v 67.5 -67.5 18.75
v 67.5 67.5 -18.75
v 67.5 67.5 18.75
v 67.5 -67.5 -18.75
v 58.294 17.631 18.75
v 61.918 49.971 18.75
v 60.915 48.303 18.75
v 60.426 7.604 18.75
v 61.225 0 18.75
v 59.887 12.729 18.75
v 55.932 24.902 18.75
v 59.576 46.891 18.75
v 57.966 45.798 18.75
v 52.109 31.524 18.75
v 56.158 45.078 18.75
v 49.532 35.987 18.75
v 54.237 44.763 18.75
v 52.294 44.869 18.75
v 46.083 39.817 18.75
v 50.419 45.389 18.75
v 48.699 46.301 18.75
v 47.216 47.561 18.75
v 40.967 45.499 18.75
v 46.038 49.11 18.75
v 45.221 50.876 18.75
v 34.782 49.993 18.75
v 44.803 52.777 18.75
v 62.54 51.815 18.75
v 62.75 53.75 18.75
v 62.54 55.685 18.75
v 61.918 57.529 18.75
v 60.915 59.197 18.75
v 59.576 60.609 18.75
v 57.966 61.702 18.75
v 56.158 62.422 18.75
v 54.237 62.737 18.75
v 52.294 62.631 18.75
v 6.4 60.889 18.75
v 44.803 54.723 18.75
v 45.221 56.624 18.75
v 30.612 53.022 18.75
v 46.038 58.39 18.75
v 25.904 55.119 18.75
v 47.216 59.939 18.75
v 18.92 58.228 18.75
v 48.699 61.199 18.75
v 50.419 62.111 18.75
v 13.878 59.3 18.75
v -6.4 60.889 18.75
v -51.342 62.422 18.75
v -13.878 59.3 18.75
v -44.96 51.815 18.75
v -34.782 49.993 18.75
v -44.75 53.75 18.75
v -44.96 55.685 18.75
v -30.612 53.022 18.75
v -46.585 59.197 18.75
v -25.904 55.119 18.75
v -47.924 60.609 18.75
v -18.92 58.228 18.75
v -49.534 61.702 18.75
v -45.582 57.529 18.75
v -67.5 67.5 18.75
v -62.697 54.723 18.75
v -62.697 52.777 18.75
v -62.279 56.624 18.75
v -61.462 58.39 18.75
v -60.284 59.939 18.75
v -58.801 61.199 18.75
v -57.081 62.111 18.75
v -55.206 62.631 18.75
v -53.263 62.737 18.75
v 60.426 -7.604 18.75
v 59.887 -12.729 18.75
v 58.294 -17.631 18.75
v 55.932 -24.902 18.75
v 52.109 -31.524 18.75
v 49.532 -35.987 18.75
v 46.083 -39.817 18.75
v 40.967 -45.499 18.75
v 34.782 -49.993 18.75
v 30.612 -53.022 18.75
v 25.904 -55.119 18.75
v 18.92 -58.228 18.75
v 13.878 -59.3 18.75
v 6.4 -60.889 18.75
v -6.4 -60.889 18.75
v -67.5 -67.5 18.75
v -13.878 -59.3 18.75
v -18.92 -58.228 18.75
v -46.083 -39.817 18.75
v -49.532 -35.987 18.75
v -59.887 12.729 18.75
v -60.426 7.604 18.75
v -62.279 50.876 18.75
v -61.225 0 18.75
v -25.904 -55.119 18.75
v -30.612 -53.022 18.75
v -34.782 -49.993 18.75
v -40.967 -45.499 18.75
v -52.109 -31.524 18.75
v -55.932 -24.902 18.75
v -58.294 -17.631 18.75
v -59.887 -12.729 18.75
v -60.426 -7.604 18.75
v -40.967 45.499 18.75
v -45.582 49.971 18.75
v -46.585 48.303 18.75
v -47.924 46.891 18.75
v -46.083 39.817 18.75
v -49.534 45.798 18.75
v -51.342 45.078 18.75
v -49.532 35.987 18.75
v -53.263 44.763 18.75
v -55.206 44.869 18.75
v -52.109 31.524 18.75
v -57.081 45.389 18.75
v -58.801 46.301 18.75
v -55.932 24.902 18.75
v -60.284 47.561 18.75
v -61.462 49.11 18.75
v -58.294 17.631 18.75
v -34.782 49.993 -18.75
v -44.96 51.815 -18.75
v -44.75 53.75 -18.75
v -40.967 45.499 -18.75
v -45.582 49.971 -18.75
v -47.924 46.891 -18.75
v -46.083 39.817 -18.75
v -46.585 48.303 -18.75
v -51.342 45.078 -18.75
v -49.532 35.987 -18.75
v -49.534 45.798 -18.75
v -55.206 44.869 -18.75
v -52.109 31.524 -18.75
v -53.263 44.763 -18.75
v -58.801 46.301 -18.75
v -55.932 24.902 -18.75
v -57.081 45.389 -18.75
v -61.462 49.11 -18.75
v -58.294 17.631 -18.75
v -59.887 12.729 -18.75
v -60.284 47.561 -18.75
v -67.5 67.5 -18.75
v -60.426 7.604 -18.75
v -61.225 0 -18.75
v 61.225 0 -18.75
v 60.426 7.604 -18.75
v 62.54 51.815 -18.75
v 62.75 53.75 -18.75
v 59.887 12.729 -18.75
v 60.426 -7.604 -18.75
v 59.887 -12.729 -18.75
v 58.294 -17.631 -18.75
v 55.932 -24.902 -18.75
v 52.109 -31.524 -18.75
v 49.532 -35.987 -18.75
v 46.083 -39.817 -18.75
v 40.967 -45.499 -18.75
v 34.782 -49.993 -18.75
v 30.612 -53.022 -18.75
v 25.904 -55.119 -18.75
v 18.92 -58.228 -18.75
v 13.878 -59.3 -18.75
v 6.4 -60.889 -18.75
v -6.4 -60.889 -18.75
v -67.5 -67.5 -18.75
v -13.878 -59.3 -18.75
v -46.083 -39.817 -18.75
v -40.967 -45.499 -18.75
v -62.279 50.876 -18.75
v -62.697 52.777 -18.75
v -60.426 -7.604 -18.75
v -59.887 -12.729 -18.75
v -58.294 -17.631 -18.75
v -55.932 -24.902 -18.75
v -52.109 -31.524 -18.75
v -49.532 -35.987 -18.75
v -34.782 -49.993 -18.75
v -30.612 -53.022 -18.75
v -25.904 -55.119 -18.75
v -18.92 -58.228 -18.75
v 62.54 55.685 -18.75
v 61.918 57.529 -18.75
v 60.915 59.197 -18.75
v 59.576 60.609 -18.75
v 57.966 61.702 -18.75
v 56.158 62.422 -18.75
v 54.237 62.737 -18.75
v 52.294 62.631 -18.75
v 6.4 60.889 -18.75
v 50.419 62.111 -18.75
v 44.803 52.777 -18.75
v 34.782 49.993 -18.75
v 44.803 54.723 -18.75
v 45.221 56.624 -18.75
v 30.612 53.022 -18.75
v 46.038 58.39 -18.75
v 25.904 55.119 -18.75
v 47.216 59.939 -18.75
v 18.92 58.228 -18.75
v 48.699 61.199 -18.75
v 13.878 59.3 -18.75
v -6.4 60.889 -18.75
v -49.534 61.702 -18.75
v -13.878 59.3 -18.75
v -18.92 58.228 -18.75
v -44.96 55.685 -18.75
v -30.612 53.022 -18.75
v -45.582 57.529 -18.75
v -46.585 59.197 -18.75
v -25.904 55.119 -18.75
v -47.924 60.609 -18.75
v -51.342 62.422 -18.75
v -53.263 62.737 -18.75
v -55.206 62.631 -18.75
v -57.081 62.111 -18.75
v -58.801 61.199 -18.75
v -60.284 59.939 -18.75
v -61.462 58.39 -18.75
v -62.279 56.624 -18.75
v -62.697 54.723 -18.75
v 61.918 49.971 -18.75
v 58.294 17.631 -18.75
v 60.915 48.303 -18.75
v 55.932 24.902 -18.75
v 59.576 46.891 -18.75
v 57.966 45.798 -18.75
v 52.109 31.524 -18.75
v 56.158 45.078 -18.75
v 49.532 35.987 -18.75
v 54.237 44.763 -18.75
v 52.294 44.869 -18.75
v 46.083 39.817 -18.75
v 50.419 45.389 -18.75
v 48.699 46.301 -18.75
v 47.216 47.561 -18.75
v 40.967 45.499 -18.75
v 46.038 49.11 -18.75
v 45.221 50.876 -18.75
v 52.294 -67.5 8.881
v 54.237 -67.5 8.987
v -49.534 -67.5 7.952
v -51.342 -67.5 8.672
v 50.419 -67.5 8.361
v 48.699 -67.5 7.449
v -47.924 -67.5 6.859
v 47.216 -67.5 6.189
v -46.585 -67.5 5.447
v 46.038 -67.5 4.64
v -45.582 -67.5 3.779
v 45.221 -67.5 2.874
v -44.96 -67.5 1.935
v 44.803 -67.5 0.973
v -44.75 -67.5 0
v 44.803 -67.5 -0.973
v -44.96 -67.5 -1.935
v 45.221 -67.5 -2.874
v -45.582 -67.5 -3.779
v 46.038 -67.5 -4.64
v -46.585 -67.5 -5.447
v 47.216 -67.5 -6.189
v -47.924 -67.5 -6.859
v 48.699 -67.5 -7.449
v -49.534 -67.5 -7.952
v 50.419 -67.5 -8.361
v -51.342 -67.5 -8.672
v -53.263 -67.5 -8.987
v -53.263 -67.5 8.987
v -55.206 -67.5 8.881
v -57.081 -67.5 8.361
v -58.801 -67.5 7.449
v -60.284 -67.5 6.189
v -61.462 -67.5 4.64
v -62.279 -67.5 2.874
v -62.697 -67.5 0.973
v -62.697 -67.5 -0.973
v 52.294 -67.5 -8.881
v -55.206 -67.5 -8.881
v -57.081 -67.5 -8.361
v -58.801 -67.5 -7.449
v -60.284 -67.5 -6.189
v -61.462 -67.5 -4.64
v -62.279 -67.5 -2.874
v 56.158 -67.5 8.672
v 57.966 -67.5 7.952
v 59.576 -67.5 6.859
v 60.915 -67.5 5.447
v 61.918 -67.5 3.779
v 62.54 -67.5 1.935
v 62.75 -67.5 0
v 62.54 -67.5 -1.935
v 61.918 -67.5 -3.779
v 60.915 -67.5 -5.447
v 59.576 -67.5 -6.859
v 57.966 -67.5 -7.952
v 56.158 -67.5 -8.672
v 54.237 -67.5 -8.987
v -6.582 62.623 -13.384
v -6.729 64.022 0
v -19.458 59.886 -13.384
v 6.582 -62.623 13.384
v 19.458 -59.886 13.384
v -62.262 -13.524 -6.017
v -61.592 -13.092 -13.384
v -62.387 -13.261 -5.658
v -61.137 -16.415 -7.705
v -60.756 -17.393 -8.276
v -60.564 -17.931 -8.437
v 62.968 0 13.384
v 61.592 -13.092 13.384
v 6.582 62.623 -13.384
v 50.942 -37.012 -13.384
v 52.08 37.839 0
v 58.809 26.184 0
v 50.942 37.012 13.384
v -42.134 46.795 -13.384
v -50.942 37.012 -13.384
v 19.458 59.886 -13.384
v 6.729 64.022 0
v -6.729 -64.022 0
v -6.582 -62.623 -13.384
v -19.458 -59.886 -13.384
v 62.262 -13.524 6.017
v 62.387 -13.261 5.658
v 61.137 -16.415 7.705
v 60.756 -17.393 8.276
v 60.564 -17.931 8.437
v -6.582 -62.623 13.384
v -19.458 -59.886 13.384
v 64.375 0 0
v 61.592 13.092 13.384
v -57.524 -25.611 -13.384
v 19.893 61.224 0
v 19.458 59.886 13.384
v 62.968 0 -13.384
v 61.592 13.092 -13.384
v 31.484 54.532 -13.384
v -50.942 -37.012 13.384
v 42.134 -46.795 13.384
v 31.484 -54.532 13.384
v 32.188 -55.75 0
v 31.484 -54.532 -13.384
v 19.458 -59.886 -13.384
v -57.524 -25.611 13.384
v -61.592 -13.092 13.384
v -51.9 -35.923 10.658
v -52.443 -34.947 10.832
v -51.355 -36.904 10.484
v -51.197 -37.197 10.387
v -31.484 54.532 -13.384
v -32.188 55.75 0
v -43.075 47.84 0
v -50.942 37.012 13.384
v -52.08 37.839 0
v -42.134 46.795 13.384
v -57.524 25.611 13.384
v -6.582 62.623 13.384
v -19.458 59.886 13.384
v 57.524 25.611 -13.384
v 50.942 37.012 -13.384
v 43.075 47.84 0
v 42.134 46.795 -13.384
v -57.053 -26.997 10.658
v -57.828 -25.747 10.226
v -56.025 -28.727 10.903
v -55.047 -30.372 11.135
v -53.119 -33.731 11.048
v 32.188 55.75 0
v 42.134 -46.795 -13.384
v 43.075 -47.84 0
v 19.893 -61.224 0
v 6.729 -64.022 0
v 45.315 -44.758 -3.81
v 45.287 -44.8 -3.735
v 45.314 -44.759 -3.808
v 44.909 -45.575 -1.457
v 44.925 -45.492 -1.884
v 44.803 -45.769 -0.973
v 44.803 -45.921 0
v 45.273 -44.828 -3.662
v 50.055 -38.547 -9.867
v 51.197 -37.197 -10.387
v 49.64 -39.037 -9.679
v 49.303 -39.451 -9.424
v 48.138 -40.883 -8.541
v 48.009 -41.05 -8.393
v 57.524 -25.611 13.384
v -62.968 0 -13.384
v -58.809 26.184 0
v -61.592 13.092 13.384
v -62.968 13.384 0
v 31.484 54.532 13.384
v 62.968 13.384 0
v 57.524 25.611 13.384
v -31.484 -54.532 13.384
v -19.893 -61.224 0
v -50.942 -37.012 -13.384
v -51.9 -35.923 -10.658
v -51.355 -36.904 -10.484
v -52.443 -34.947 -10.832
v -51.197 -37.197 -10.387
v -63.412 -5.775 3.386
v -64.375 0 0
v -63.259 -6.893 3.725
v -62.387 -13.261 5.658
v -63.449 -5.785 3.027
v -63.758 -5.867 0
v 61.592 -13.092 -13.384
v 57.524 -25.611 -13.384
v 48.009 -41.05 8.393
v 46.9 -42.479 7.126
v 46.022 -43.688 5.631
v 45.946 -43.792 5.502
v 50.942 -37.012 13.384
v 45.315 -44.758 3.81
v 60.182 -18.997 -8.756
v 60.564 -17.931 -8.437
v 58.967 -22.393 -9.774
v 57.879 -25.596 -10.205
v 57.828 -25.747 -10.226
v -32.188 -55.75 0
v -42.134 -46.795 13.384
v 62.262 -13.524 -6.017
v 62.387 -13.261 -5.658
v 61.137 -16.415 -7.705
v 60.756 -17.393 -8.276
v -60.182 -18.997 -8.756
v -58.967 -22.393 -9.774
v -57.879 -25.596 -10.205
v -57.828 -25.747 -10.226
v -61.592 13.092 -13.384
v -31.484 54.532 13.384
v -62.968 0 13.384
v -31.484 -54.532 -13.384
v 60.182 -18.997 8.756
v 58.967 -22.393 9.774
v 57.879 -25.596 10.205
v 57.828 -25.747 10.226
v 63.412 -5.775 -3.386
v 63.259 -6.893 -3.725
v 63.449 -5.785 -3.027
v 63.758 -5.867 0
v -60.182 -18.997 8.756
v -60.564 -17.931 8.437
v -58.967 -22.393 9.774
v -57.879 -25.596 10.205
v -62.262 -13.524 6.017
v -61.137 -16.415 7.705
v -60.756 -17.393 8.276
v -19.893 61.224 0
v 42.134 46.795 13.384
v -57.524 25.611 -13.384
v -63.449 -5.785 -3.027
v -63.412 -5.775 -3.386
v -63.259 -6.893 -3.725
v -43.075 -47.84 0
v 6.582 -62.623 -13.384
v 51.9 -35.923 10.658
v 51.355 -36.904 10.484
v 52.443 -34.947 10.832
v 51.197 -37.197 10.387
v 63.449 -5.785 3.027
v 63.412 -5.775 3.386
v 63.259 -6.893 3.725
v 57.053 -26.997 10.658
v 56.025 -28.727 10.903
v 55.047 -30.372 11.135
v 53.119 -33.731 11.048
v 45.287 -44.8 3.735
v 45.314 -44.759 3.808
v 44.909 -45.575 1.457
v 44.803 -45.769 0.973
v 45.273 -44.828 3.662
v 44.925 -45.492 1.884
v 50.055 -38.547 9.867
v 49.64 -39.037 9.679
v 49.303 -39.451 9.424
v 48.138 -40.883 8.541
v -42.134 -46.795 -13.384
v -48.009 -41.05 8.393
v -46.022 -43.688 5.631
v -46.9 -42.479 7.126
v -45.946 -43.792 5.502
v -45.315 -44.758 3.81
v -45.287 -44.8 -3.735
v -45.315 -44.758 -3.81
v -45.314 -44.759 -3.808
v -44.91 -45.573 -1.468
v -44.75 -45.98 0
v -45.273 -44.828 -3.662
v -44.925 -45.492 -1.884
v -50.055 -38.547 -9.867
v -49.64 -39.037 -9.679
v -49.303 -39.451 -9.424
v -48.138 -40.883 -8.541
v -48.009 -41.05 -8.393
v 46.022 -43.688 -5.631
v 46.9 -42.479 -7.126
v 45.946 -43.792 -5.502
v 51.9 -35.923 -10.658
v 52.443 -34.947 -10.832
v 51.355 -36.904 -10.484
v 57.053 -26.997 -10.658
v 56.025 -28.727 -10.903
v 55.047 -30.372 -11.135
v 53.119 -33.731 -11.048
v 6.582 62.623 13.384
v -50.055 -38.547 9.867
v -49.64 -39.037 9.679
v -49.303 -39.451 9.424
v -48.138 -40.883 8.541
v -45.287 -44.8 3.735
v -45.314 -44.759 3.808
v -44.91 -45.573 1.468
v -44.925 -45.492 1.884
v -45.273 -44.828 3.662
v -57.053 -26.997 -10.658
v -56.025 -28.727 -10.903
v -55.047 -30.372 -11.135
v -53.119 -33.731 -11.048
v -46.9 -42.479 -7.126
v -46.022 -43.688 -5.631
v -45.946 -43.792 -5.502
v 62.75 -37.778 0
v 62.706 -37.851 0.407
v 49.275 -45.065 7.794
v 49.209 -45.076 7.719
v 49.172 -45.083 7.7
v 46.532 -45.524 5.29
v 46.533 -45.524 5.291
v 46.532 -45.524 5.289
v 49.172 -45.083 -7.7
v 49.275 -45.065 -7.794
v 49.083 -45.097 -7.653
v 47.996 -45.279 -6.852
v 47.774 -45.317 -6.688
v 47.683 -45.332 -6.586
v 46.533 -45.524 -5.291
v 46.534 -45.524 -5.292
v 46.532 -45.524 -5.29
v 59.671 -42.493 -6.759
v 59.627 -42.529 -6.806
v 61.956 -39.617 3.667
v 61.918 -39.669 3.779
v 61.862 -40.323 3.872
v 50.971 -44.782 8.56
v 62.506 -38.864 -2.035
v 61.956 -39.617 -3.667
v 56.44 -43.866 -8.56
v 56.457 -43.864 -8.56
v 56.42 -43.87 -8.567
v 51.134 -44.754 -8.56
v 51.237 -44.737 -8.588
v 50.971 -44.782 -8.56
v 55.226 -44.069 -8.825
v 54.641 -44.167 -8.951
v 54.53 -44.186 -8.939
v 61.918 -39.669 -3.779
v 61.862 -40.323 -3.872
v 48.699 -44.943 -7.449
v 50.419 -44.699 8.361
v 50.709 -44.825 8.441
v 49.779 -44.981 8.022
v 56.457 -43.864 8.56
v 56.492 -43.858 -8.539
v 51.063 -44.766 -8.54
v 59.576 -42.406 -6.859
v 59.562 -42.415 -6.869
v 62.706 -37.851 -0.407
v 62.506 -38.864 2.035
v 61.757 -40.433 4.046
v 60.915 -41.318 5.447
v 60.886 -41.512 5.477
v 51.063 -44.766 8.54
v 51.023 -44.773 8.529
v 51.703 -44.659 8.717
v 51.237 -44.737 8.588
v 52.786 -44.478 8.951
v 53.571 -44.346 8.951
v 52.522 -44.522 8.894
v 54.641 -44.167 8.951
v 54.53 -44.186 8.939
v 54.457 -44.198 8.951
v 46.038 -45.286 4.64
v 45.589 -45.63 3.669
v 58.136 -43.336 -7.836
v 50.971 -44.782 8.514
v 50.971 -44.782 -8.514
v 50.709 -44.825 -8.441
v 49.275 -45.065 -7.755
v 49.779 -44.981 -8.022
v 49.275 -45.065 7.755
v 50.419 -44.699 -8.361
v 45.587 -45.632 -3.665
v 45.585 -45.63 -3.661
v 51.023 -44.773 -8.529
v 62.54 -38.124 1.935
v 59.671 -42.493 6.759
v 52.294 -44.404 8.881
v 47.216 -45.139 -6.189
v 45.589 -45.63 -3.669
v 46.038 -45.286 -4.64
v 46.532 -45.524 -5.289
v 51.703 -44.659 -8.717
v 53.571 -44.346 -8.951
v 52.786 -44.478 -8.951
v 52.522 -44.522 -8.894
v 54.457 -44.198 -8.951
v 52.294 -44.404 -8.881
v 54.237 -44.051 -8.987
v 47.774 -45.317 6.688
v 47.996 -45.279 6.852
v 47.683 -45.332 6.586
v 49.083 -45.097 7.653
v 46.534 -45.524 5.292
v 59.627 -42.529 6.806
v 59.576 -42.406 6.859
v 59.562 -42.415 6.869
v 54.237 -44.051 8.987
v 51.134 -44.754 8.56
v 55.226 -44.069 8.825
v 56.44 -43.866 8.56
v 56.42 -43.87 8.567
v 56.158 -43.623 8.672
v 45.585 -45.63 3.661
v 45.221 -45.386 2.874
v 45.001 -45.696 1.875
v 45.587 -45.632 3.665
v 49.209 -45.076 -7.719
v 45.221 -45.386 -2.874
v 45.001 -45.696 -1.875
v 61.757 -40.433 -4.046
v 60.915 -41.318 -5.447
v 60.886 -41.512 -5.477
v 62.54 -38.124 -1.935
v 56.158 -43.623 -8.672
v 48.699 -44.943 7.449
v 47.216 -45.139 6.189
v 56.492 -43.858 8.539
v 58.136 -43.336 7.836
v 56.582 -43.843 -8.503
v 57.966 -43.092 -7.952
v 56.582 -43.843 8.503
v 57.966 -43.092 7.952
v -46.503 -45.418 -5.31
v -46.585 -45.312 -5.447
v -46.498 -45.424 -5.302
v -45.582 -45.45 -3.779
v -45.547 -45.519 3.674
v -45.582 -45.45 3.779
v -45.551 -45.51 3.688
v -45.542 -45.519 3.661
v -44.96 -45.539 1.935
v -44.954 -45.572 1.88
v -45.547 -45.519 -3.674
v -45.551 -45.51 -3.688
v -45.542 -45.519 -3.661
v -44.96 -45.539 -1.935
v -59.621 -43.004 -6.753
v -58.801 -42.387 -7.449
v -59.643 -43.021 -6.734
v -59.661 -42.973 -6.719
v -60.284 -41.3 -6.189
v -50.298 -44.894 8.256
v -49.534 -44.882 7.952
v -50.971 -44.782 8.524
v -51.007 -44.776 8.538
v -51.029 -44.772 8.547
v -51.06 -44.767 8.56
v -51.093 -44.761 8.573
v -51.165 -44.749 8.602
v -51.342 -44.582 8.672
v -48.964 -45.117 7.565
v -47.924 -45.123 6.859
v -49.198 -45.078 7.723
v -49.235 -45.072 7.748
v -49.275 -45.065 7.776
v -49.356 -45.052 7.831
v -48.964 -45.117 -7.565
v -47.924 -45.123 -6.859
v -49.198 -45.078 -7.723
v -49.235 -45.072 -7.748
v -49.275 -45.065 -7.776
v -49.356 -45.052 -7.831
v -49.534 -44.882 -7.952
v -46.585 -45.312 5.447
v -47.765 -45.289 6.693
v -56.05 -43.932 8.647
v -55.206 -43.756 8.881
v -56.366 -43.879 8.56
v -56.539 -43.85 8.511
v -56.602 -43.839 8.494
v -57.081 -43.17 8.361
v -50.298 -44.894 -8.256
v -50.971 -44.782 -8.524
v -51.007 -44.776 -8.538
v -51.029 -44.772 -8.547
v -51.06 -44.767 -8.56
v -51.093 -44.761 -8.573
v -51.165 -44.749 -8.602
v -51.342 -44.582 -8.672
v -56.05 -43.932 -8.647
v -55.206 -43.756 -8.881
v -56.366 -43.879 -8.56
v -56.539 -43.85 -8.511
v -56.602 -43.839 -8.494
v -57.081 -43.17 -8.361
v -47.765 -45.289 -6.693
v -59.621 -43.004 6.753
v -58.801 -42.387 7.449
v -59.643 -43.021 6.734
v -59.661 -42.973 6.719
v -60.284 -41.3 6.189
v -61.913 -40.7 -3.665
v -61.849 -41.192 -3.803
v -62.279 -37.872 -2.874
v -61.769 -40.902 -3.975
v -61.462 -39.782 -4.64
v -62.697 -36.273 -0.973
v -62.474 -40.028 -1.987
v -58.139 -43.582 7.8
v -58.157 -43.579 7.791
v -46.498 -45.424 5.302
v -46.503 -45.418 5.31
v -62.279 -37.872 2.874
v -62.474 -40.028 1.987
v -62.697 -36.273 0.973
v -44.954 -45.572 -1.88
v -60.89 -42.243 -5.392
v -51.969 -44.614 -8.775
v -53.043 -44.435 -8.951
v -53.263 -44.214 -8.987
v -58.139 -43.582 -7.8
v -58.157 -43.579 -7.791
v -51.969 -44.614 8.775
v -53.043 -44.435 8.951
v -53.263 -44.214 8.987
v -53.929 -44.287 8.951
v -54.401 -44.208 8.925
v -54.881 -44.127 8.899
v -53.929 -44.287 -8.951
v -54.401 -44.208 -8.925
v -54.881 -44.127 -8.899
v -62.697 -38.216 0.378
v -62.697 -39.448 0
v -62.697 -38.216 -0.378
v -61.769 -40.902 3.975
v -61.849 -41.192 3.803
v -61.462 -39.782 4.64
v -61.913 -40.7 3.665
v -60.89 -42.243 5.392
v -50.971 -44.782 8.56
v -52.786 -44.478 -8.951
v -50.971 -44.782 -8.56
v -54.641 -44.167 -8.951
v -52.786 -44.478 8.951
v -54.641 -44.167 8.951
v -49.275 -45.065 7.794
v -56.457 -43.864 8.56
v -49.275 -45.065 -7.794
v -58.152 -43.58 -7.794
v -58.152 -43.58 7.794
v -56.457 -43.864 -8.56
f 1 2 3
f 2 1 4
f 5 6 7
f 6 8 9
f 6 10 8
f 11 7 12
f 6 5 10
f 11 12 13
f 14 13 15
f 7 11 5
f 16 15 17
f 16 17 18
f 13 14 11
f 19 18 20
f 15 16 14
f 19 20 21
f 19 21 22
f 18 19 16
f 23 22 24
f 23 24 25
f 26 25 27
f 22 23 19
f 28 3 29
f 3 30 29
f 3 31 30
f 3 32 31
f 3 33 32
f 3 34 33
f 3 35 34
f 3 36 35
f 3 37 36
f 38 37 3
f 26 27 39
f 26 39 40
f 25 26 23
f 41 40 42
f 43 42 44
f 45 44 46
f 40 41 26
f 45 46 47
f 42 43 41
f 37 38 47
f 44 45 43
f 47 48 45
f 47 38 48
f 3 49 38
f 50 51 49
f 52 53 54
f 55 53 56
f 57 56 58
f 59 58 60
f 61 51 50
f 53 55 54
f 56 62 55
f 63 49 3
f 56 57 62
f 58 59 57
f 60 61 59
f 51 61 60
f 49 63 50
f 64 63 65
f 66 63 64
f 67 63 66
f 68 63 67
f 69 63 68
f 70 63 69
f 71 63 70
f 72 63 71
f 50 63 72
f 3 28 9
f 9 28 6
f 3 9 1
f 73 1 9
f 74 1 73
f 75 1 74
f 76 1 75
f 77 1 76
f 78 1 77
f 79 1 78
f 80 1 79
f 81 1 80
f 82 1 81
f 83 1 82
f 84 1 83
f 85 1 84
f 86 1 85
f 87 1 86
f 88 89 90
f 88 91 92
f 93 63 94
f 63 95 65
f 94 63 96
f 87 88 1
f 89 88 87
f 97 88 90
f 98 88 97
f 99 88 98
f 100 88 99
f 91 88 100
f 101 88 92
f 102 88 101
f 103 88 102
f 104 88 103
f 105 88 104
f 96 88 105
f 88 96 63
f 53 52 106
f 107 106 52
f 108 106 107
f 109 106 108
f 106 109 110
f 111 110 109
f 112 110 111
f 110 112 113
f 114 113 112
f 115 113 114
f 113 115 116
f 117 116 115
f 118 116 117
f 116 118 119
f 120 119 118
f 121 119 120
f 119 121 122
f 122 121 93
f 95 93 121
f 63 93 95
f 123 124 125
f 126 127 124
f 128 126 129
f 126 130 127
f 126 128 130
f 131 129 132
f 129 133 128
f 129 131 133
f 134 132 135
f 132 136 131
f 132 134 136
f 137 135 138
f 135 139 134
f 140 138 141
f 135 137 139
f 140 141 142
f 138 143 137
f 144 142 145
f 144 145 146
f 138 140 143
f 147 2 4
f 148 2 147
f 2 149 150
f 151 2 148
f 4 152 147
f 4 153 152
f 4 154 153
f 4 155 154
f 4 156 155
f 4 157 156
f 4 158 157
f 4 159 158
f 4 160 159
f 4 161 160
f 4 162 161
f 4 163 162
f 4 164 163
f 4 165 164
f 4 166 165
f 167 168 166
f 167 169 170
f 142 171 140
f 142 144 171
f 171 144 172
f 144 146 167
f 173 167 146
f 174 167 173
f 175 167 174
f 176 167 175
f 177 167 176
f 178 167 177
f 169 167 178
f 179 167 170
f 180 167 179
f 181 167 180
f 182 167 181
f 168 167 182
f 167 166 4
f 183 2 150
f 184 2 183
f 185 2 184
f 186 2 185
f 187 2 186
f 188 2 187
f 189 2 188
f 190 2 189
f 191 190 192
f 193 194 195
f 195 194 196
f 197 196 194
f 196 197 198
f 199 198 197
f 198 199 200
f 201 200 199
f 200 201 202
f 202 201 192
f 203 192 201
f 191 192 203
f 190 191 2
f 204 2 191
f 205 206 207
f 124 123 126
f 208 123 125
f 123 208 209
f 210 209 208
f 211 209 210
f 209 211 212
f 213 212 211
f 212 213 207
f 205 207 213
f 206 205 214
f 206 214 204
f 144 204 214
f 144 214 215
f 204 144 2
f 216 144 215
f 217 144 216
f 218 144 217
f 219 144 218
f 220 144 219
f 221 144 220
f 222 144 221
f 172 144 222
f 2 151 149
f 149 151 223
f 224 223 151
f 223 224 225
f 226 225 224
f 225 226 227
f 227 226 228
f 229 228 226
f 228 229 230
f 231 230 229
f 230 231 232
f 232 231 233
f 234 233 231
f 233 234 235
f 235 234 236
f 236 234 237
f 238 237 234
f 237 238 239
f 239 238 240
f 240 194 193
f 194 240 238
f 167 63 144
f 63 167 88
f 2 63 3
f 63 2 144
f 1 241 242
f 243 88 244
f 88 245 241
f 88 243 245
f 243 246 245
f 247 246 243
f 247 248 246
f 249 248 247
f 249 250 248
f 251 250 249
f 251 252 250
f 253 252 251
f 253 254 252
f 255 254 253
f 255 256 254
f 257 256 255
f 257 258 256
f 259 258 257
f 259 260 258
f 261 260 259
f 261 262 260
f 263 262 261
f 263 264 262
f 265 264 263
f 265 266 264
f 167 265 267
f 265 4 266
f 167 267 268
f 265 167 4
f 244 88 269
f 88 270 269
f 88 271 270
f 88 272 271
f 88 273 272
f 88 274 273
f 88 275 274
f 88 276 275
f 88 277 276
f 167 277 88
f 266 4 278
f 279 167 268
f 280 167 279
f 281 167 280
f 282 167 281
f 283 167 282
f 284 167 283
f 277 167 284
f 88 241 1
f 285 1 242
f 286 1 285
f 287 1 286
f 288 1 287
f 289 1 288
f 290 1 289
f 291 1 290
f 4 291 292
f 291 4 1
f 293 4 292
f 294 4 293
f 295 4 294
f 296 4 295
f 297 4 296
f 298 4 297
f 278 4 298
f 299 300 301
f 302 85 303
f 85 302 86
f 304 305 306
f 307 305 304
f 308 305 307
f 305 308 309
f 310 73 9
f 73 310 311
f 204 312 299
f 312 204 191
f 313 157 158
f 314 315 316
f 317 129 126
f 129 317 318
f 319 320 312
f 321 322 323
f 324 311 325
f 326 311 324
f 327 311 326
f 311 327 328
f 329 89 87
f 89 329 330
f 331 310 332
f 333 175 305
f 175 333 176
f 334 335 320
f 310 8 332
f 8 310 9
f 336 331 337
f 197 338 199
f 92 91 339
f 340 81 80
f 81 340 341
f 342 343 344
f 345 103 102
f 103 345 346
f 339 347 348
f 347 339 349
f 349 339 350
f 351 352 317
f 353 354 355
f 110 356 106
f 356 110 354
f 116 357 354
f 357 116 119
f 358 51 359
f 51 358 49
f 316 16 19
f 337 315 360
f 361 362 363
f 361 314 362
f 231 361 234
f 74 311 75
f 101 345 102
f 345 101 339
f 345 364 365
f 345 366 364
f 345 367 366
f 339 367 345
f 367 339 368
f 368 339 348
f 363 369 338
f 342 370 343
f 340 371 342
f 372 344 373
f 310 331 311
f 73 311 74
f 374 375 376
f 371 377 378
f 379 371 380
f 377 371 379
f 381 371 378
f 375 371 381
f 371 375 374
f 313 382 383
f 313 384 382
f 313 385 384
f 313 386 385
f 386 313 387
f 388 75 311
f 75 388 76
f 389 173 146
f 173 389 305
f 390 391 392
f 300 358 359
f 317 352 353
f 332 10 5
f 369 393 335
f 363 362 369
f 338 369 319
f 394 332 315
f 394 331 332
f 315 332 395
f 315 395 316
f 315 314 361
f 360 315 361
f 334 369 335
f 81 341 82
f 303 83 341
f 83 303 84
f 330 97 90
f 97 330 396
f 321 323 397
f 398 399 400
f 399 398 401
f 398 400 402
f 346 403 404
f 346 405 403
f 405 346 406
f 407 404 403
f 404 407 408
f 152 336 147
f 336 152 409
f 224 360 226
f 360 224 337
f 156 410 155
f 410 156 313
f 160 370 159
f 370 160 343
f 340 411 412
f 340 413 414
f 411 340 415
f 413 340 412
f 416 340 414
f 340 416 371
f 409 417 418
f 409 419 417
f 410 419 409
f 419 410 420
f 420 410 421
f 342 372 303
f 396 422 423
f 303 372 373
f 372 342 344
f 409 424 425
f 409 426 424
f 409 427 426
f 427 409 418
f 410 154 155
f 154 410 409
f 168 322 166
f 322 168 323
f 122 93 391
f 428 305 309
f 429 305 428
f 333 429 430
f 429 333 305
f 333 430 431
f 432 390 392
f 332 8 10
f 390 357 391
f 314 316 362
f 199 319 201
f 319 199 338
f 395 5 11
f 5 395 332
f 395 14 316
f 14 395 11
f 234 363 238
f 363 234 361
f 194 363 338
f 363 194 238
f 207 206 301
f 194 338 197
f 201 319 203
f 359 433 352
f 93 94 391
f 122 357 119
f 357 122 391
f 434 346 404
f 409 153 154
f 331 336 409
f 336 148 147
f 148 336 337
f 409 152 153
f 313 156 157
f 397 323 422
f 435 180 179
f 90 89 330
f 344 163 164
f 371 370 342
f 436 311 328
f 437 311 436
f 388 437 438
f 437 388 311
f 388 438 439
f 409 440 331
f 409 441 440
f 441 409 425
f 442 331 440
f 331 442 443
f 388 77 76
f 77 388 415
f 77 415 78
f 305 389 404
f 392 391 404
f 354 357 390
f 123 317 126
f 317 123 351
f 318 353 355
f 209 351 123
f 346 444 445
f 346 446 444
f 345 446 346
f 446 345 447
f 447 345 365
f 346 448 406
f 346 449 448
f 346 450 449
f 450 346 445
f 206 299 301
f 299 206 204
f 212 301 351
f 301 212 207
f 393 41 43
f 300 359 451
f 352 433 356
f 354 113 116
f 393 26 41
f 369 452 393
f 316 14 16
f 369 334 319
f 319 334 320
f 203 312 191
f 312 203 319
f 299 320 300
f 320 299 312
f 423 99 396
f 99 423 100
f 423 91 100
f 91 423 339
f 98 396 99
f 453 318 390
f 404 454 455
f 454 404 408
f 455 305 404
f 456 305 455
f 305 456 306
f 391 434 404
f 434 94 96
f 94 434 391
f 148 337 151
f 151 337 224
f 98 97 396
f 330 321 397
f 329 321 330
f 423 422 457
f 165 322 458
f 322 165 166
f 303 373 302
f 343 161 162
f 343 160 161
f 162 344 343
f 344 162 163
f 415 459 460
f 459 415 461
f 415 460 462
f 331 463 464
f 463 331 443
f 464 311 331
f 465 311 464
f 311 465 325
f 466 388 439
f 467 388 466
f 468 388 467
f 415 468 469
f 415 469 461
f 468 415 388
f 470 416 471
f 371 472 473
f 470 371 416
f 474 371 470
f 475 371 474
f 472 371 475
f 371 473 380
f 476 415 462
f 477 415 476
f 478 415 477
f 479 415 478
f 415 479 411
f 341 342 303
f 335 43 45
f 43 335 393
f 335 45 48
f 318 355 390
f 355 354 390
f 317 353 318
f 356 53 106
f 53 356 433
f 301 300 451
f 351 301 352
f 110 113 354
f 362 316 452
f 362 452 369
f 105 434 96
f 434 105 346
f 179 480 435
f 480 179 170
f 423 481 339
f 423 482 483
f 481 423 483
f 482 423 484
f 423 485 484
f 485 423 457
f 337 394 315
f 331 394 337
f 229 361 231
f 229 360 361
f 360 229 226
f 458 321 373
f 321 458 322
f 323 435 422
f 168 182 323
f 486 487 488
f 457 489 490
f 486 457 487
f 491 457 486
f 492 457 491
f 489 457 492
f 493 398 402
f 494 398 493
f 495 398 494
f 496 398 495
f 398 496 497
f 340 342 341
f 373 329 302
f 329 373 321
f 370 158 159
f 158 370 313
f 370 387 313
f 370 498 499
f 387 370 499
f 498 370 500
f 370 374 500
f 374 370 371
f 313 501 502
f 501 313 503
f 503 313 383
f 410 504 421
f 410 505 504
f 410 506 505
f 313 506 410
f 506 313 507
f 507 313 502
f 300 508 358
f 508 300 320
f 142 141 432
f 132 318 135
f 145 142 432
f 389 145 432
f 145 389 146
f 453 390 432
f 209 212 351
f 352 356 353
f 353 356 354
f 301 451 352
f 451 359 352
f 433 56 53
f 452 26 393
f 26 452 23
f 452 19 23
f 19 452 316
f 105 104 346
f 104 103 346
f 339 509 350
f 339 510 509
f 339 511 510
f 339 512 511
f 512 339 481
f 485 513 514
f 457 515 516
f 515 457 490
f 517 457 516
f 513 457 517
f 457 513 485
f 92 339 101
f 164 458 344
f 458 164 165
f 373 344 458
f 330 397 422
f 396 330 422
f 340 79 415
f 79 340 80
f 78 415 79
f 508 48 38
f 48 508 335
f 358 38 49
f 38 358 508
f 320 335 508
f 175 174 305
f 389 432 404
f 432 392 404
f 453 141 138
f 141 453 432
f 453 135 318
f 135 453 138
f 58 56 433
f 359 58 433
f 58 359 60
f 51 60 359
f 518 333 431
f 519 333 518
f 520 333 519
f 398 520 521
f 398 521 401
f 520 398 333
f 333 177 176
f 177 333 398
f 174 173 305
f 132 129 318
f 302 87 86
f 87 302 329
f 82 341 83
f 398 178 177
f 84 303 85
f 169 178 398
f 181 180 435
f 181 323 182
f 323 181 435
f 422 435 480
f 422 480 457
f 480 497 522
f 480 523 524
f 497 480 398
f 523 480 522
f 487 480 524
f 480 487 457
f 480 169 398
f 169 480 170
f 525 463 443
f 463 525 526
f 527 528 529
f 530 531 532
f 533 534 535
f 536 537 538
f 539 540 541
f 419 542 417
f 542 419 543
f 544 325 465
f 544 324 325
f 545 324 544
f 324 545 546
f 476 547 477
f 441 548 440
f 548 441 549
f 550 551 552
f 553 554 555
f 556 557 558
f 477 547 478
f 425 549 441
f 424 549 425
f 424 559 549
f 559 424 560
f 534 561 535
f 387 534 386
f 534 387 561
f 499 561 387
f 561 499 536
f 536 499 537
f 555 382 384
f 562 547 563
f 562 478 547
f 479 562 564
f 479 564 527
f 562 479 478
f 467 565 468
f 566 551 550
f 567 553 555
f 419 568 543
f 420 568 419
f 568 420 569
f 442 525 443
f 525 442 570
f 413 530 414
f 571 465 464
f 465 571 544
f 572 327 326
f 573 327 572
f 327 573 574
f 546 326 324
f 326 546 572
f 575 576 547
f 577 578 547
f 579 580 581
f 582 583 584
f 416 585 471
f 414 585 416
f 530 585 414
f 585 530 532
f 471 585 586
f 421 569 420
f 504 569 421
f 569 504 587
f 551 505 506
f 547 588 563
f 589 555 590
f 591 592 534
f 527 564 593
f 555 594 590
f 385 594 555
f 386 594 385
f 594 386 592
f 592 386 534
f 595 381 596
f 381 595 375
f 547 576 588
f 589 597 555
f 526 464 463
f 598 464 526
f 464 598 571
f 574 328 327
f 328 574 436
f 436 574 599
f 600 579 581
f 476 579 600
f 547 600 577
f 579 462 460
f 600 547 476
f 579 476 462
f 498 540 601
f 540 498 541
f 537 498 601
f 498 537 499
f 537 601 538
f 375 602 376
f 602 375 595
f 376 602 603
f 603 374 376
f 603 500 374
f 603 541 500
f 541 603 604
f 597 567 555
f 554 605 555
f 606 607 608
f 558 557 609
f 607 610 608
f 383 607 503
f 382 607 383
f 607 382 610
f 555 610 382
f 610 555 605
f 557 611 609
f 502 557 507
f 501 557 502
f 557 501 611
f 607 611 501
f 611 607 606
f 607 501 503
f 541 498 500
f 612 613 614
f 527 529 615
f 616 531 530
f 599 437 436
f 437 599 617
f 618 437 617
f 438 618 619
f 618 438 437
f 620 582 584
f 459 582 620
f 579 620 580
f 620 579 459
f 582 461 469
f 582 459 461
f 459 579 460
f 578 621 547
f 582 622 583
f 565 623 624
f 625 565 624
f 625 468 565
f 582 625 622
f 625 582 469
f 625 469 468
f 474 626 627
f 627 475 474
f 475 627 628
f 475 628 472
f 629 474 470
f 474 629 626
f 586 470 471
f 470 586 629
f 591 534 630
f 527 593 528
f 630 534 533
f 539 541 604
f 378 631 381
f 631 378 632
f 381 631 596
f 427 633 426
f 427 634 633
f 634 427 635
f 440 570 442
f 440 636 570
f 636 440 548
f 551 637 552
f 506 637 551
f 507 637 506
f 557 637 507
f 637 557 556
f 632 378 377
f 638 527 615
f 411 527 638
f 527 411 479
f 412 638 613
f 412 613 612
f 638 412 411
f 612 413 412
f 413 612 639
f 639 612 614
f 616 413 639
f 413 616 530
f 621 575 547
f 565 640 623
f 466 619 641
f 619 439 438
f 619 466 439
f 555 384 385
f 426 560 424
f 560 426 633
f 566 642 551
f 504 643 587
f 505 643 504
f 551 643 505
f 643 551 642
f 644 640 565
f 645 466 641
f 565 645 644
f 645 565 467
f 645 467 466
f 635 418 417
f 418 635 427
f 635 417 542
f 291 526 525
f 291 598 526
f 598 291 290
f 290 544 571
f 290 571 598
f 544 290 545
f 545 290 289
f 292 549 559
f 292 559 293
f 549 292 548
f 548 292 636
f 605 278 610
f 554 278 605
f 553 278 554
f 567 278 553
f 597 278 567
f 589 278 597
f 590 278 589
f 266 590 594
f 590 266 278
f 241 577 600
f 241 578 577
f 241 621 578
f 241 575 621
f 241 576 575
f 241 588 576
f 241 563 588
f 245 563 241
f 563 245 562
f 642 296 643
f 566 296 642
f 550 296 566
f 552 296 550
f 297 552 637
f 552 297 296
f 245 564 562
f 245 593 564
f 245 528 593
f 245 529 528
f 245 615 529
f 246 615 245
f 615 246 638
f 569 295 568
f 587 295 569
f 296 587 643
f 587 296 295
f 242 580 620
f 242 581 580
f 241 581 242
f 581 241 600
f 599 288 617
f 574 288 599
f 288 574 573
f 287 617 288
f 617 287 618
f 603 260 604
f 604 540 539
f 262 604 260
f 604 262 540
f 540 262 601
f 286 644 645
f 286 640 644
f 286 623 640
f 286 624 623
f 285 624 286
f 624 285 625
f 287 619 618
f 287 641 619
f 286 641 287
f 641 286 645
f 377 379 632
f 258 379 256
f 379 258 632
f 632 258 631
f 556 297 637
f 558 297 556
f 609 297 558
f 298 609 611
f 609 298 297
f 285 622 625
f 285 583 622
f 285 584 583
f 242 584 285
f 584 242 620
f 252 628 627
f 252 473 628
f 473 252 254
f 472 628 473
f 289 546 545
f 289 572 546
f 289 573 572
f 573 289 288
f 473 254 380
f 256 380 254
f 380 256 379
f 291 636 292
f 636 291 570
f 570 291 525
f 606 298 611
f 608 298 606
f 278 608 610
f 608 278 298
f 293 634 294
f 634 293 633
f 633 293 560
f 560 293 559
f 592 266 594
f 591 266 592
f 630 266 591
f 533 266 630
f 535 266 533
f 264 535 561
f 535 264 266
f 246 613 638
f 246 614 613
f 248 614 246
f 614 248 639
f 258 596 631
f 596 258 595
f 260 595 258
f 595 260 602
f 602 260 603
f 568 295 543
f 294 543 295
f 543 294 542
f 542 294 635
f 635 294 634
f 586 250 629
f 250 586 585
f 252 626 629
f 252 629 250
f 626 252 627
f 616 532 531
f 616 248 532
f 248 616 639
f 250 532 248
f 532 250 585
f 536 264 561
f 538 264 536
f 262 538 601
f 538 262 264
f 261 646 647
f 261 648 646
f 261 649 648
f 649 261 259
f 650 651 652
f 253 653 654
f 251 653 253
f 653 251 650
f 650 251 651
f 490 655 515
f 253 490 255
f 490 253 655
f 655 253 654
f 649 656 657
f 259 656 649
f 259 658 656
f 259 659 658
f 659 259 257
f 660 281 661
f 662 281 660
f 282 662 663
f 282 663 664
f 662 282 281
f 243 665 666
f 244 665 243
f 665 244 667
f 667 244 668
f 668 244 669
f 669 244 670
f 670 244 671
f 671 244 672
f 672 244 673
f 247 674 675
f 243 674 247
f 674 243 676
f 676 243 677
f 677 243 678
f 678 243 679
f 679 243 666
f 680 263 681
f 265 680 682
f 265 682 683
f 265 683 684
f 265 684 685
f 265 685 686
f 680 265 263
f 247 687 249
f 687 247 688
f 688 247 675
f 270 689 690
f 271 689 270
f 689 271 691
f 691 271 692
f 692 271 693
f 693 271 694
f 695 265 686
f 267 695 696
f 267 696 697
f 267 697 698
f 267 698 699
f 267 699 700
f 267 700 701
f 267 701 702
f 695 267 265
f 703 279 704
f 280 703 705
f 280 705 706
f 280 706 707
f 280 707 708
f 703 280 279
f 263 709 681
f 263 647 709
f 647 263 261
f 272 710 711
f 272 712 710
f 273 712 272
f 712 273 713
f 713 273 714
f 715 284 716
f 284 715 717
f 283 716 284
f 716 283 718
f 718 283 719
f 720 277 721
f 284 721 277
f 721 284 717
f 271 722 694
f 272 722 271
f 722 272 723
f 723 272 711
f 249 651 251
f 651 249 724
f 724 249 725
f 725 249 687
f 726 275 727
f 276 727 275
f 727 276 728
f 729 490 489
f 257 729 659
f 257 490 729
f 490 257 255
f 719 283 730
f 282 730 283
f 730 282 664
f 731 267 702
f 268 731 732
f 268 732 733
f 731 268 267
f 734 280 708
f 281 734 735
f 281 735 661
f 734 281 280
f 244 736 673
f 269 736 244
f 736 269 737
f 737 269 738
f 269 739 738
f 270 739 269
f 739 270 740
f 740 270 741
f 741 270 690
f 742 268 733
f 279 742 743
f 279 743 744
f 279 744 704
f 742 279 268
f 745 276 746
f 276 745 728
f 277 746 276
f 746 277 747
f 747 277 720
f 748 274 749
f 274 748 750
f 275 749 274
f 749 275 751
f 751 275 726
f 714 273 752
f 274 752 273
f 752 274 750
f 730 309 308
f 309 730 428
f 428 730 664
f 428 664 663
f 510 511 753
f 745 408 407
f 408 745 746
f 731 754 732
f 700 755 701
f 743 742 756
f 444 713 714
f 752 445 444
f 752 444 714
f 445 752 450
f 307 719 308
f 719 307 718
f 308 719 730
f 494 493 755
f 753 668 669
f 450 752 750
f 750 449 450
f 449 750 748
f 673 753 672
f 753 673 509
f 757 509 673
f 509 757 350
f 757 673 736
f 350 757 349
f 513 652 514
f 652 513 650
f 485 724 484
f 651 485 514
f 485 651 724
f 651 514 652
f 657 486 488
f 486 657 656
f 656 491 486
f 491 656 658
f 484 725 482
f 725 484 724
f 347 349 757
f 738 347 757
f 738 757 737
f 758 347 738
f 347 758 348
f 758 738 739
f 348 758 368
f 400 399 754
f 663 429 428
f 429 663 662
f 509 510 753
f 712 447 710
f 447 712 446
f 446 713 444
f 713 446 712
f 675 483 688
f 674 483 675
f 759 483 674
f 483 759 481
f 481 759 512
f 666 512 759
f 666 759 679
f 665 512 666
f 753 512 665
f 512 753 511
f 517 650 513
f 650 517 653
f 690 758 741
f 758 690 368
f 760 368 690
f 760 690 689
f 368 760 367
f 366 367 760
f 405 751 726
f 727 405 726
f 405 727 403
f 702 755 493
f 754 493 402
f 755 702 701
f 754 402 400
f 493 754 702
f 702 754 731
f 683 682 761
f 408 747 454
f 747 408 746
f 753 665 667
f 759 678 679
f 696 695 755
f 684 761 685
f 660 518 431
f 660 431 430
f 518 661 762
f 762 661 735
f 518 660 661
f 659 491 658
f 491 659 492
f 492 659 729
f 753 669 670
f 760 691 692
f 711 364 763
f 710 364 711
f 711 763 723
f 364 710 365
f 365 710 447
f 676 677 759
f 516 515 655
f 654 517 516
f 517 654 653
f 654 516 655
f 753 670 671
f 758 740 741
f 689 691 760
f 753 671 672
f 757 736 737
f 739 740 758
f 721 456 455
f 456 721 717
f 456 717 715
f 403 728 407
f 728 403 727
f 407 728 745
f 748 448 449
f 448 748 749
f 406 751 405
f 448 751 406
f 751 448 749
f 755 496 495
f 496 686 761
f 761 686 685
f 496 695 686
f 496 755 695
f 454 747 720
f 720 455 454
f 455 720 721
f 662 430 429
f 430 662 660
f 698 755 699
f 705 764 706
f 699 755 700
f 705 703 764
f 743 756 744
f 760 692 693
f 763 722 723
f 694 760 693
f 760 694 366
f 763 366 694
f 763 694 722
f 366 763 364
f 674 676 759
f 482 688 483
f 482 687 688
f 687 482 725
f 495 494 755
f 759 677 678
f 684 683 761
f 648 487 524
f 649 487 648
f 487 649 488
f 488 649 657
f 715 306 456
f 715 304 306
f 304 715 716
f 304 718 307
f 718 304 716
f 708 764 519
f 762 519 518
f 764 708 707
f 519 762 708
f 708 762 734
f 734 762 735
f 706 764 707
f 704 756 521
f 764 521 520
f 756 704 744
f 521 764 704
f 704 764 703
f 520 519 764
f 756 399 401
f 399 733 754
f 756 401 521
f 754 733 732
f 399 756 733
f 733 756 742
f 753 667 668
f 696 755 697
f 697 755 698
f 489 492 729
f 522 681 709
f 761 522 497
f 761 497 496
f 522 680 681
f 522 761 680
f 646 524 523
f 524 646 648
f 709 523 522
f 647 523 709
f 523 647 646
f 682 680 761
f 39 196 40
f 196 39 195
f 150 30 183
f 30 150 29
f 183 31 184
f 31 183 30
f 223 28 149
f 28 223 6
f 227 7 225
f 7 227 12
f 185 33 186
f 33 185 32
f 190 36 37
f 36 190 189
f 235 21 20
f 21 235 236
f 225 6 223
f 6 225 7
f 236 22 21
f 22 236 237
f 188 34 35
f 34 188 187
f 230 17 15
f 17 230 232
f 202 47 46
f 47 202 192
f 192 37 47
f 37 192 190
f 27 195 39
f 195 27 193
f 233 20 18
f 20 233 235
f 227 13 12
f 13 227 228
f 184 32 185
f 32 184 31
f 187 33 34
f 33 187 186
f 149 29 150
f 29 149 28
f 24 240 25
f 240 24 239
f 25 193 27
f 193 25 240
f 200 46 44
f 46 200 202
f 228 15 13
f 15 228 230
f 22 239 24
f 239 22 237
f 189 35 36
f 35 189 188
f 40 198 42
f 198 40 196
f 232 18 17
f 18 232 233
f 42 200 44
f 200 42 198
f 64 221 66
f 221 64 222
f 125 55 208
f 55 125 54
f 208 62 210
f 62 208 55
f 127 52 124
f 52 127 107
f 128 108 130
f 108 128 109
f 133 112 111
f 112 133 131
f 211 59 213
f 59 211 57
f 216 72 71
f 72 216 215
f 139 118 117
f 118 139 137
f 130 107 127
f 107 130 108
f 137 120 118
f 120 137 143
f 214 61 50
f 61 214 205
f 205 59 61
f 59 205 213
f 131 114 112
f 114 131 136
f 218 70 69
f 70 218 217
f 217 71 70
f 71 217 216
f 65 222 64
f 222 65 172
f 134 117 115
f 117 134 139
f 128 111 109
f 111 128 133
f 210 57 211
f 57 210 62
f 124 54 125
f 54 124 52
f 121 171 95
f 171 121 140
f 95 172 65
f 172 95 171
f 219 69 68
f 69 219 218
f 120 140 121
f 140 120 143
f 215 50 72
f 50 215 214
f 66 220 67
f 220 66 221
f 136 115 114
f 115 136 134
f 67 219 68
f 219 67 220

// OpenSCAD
//set up for 5/8 in OD tubing currently all measurements are in mm
module pumprim(){
	tube_d=18;
	tube_squish_w=25;
	tube_squish_thick=4;
	outside_d=135;
	rim_thick=5;
	
	hole_offset=(outside_d/2-rim_thick*2.75);
	difference(){
		
		cube([outside_d,outside_d,tube_squish_w*1.5],center=true);
		sphere(d=outside_d-rim_thick*1.25);
		translate([hole_offset-rim_thick*.75,-outside_d/6.1,0]){rotate([90,0,9.5]){cylinder(h=outside_d/3,d1=tube_d*2,d2=tube_d,center=true);}}
		translate([hole_offset,0,0]){rotate([90,0,0]){cylinder(h=outside_d/2+10,d=tube_d);}}
		//translate([hole_offset,-(outside_d/6),0]){rotate([90,0,0]){cube([tube_d,tube_squish_w,outside_d/3],center=true);}}
		//translate([-80,-10,0]){rotate([90,0,0]){cylinder(h=110,r=tube_d);}}
		//translate([-hole_offset-tube_d,-10,0]){rotate([90,0,-11]){cylinder(h=50,d1=tube_d*2,d2=tube_d);}}
		//translate([-hole_offset,-50,0]){rotate([90,0,0]){cylinder(h=outside_d/2+10,d=tube_d);}}
		translate([-hole_offset,0,0]){rotate([90,0,0]){cylinder(h=outside_d/2+10,d=tube_d);}}
		translate([-hole_offset+rim_thick*.75,-outside_d/6.1,0]){rotate([90,0,-9.5]){cylinder(h=outside_d/3,d1=tube_d*2,d2=tube_d,center=true);}}
		//translate([-hole_offset,-(outside_d/6),0]){rotate([90,0,0]){cube([tube_d,tube_squish_w,outside_d/3],center=true);}}
//holes through body
	translate([hole_offset,hole_offset,0]){cylinder(h=outside_d/2+10,d=tube_d,center=true);}
	translate([-hole_offset,hole_offset,0]){cylinder(h=outside_d/2+10,d=tube_d,center=true);}
	
//front holes
	//translate([hole_offset,-hole_offset,0]){cylinder(h=outside_d/2+10,d=tube_d,center=true);}
	//translate([-hole_offset,-hole_offset,0]){cylinder(h=outside_d/2+10,d=tube_d,center=true);}
	}
	
}
pumprim();
